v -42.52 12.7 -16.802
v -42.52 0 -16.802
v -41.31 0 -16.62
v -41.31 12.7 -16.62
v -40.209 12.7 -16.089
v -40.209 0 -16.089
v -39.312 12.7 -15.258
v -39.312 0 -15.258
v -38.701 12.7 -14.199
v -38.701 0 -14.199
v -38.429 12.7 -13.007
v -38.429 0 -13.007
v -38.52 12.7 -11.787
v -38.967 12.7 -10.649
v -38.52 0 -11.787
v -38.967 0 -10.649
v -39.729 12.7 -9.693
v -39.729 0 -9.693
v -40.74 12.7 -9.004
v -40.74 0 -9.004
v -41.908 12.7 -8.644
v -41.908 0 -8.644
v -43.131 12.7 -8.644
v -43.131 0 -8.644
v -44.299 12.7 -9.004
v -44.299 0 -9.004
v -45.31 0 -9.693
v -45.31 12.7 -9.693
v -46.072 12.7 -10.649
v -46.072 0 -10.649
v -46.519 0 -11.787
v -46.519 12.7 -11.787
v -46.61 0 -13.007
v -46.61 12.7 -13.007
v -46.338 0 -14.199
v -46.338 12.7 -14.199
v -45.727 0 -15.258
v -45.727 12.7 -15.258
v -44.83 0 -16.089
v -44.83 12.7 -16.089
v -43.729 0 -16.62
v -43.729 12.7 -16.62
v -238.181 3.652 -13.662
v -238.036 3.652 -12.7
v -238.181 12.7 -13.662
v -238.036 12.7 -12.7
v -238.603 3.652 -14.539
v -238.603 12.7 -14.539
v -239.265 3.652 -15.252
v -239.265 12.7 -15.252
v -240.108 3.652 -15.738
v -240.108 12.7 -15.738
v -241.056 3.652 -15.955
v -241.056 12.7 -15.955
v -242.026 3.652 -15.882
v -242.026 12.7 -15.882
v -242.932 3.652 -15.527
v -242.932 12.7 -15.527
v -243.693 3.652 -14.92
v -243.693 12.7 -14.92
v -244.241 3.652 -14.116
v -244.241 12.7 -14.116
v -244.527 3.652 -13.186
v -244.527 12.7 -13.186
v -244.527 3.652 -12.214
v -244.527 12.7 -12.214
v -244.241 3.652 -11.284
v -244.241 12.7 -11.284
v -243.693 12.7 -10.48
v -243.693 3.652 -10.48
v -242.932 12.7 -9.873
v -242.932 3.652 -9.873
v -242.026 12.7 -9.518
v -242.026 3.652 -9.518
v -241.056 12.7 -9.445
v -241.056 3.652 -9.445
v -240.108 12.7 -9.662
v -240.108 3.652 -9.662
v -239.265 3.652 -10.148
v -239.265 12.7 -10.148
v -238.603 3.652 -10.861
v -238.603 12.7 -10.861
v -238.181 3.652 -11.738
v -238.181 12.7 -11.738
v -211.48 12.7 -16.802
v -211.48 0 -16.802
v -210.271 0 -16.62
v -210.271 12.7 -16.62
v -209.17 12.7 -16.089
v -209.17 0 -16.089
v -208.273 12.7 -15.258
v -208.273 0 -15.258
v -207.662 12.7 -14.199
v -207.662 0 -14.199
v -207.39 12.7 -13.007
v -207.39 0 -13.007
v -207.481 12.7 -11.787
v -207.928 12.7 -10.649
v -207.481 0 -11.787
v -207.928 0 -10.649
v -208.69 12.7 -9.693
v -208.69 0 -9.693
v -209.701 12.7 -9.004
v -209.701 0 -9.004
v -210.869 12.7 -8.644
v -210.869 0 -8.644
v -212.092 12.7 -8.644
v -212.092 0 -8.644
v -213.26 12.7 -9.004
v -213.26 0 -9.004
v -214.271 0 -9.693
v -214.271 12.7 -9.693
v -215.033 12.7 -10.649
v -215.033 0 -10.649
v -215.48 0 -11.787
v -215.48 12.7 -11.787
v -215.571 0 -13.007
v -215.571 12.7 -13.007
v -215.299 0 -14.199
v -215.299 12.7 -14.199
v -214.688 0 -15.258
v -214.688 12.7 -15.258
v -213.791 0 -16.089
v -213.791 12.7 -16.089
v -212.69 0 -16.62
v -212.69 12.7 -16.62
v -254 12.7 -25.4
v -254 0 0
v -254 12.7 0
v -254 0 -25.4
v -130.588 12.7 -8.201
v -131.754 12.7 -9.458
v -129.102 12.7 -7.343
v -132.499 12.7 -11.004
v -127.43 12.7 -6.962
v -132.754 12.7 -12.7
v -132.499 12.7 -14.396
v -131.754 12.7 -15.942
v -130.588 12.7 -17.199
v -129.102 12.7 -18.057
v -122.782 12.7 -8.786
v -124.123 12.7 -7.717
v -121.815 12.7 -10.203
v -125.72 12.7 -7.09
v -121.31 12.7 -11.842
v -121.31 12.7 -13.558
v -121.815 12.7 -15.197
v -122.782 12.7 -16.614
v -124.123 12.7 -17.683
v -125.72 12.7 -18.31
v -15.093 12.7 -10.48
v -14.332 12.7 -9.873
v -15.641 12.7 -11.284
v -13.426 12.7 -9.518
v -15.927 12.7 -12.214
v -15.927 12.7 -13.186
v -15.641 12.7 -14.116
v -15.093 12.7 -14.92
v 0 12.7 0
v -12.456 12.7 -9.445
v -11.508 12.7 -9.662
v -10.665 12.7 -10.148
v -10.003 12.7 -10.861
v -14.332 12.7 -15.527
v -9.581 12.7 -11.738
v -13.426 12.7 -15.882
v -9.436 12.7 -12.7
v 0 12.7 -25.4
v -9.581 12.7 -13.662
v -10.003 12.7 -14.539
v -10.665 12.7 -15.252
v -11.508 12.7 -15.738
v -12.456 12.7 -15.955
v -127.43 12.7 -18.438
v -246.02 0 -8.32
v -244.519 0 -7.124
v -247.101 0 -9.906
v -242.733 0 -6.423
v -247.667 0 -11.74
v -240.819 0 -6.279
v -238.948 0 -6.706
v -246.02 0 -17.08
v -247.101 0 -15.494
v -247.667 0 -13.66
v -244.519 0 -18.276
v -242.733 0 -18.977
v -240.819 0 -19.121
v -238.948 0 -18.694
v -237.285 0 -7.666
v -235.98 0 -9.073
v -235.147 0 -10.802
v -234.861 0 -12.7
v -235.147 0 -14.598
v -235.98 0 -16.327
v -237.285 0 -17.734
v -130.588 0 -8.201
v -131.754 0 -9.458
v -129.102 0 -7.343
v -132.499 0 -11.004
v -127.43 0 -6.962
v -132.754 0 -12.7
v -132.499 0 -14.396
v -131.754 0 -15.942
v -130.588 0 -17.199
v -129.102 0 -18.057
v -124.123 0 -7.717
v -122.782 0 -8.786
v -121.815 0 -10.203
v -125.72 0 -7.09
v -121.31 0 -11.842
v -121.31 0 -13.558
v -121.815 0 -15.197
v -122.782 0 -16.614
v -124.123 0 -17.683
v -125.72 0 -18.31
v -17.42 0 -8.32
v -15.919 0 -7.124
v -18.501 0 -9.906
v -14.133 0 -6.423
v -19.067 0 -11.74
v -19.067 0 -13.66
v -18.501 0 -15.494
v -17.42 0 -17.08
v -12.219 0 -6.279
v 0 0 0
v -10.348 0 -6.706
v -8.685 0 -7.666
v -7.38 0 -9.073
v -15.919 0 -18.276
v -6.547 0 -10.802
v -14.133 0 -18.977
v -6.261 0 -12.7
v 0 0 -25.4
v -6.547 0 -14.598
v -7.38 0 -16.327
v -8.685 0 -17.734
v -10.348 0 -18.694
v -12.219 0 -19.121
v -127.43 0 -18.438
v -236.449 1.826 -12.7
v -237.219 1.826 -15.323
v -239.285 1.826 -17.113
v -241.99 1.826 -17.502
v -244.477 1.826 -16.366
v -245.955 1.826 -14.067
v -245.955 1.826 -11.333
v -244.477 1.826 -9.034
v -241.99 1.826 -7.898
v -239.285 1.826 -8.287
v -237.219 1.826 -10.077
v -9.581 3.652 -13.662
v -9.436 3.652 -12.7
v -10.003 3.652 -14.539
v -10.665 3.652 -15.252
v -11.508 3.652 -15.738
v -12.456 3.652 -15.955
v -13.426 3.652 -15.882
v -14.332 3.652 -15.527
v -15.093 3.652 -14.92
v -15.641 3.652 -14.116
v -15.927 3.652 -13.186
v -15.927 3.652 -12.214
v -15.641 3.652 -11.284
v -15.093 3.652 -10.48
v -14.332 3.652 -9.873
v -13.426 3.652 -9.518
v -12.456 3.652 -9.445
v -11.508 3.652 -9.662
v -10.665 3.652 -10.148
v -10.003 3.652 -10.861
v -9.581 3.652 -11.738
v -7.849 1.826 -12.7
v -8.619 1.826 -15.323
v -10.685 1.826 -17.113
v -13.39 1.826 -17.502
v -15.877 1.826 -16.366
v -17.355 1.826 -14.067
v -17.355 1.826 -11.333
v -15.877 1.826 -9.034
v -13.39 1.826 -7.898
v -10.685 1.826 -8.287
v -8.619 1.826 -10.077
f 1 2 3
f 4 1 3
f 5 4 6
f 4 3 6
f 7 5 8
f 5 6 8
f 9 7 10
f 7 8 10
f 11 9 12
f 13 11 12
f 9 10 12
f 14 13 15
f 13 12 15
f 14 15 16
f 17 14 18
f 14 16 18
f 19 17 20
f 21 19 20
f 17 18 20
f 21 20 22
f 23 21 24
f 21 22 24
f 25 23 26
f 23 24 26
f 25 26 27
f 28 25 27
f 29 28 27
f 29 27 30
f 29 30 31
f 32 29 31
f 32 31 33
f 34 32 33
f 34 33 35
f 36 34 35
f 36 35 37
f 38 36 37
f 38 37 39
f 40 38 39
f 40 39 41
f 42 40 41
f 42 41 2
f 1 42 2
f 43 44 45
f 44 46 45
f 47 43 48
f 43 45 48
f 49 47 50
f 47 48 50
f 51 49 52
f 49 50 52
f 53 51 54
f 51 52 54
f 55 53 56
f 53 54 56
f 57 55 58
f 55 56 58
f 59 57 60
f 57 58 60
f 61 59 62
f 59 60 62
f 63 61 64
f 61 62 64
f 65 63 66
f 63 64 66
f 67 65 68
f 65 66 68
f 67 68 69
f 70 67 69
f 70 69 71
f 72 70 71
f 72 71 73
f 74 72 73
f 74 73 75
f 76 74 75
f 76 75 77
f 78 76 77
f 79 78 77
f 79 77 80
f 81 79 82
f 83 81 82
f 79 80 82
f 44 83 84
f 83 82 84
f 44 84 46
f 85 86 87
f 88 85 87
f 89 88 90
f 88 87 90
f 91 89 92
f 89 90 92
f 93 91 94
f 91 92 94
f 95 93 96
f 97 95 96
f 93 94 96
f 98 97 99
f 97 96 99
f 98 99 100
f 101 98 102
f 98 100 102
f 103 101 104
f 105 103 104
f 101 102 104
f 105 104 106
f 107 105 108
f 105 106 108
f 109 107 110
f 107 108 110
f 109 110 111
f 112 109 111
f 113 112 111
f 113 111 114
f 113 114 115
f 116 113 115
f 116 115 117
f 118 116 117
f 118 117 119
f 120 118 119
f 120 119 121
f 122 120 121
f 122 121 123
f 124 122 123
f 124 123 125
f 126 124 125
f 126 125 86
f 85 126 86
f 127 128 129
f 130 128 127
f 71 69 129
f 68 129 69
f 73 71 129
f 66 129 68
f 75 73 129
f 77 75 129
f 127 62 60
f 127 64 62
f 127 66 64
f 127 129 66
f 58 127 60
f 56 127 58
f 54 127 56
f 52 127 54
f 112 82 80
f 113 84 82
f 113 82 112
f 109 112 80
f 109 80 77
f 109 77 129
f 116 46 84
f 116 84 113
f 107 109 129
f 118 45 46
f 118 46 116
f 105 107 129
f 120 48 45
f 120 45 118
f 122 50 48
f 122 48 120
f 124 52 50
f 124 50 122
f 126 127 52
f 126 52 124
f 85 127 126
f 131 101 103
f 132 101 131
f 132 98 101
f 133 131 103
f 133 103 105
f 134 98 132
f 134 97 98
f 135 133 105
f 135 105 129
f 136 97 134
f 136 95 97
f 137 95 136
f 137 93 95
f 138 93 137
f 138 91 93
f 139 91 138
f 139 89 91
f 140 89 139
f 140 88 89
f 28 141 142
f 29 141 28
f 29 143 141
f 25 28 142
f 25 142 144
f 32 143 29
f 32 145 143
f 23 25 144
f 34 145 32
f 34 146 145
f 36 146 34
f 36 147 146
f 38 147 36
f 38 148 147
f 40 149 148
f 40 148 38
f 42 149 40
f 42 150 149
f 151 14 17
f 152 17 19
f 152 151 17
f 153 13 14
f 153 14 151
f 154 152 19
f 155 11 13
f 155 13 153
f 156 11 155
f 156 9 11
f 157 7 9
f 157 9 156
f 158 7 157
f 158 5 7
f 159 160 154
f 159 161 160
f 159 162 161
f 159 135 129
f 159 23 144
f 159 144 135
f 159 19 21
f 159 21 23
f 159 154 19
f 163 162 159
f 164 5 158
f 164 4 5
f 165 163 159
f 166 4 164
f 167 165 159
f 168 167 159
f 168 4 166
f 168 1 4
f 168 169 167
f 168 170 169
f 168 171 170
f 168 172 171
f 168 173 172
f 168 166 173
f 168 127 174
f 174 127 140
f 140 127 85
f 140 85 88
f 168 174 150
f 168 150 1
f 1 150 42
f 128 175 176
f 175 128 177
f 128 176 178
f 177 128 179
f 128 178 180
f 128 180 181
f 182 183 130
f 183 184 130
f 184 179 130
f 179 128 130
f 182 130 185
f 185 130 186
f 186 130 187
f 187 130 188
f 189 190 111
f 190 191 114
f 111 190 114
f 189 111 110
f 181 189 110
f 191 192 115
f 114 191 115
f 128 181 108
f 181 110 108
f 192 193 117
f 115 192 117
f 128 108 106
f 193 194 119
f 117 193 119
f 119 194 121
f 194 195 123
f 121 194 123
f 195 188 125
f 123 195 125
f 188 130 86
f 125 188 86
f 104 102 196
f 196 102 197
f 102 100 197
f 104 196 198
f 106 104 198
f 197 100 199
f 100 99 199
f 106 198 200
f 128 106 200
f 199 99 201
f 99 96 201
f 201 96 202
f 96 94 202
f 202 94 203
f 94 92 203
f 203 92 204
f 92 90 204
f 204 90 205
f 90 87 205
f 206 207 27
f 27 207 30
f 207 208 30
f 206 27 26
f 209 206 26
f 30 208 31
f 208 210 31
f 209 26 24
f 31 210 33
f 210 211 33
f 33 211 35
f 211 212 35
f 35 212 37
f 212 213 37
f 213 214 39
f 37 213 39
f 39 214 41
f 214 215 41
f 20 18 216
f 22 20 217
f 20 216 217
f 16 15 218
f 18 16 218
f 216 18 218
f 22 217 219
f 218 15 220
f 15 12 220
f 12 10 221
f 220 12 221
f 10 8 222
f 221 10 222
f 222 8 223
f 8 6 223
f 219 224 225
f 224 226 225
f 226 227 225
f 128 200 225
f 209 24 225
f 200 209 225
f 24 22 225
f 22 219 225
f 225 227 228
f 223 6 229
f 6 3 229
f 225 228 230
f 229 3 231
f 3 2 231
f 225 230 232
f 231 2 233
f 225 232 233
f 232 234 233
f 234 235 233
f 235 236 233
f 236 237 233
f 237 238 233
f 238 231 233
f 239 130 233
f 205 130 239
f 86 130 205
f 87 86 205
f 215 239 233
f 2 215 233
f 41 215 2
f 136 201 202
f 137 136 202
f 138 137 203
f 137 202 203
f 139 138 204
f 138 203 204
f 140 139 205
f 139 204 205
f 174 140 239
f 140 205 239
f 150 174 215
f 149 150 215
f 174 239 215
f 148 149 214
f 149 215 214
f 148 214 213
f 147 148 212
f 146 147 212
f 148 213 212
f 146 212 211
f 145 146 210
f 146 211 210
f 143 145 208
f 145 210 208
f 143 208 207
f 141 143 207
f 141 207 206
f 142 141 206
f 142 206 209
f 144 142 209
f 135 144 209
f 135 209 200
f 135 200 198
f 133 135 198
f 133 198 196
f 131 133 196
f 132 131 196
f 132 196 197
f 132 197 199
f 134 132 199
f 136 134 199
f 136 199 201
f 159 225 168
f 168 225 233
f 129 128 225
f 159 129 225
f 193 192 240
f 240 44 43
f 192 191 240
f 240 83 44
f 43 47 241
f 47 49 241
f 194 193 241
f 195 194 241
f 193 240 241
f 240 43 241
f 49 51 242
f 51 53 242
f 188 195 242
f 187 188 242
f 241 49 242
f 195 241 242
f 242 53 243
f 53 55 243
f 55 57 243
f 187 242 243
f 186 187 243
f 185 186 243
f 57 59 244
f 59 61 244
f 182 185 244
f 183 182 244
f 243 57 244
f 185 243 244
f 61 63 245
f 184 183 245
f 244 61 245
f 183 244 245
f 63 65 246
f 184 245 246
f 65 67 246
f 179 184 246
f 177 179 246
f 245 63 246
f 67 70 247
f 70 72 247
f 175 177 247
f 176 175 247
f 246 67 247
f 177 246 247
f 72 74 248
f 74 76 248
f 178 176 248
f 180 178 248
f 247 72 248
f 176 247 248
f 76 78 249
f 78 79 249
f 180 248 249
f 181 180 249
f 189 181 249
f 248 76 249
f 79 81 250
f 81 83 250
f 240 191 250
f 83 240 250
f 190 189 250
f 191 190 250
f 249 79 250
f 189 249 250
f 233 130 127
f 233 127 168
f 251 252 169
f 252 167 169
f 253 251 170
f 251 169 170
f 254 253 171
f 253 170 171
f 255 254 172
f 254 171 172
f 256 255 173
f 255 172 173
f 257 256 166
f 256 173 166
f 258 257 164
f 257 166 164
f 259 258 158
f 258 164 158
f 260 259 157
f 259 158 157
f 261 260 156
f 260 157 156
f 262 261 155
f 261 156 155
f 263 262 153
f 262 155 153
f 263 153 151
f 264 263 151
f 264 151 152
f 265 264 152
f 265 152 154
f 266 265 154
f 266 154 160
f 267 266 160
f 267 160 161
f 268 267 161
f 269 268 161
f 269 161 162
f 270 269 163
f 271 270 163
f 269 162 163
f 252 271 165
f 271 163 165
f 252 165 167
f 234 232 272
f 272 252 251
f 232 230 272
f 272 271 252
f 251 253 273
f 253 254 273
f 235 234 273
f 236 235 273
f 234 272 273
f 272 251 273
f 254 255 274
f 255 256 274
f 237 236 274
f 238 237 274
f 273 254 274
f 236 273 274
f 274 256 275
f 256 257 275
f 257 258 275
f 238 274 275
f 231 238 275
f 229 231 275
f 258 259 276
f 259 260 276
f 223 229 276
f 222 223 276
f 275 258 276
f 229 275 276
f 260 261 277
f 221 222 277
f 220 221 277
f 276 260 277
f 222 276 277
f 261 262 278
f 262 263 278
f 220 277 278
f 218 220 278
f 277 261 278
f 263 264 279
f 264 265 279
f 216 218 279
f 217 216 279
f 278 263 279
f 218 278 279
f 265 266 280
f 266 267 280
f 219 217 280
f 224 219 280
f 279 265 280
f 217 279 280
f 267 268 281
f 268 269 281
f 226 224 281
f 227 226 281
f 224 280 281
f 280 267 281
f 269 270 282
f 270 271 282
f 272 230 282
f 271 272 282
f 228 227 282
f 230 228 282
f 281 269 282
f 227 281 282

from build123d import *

# Parameters (mm, degrees)
SKETCH1_W                                        = 254
SKETCH1_H                                        = 25.4
BOSS_EXTRUDE1_DEPTH                              = 12.7
SKETCH2_R                                        = 5.08
F_1_2_20_THREAD_THRU_DEPTH                       = 256.582569828
SKETCH4_R                                        = 4.1021
CUT_EXTRUDE4_DEPTH                               = 256.582569828
CSK_FOR_1_4_FLAT_HEAD_MACHINE_SCREW1_D           = 6.5278
CSK_FOR_1_4_FLAT_HEAD_MACHINE_SCREW1_CSINK_D     = 12.8778
CSK_FOR_1_4_FLAT_HEAD_MACHINE_SCREW1_CSINK_ANGLE = 82
F_1_2_20_TAPPED_HOLE3_D                          = 11.50874


with BuildPart() as part:
    # Sketch1 → Boss-Extrude1 (new body)
    with BuildSketch(Plane(origin=(0, 0, 0), x_dir=(1, 0, 0), z_dir=(0, 1, 0))):
        with Locations((-127, 12.7)):
            Rectangle(SKETCH1_W, SKETCH1_H)
    extrude(amount=BOSS_EXTRUDE1_DEPTH)

    # Sketch2 → 1/2-20 thread thru (cut, through all)
    with BuildSketch(Plane(origin=(0, 12.7, 0), x_dir=(1, 0, 0), z_dir=(0, 1, 0))):
        with Locations((-127, 12.7)):
            Circle(SKETCH2_R)
    extrude(amount=-F_1_2_20_THREAD_THRU_DEPTH, mode=Mode.SUBTRACT)

    # Sketch4 → Cut-Extrude4 (cut, through all)
    with BuildSketch(Plane.XZ):
        with Locations(Location((-211.4804, -12.7, 0), (0, 0, 270))):
            Circle(SKETCH4_R)
        with Locations(Location((-42.5196, -12.7, 0), (0, 0, 270))):
            Circle(SKETCH4_R)
    extrude(amount=-CUT_EXTRUDE4_DEPTH, mode=Mode.SUBTRACT)

    # CSK for 1/4 Flat Head Machine Screw1 (through all)
    with Locations(Plane(origin=(0, 0, 0), x_dir=(-1, 0, 0), z_dir=(0, -1, 0))):
        with Locations((241.3, 12.7), (12.7, 12.7)):
            CounterSinkHole(CSK_FOR_1_4_FLAT_HEAD_MACHINE_SCREW1_D / 2, CSK_FOR_1_4_FLAT_HEAD_MACHINE_SCREW1_CSINK_D / 2, counter_sink_angle=CSK_FOR_1_4_FLAT_HEAD_MACHINE_SCREW1_CSINK_ANGLE)

    # 1/2-20 Tapped Hole3 (through all)
    with Locations(Plane(origin=(0, 12.7, 0), x_dir=(1, 0, 0), z_dir=(0, 1, 0))):
        with Locations((-127, 12.7)):
            Hole(F_1_2_20_TAPPED_HOLE3_D / 2)


solid = part.part
